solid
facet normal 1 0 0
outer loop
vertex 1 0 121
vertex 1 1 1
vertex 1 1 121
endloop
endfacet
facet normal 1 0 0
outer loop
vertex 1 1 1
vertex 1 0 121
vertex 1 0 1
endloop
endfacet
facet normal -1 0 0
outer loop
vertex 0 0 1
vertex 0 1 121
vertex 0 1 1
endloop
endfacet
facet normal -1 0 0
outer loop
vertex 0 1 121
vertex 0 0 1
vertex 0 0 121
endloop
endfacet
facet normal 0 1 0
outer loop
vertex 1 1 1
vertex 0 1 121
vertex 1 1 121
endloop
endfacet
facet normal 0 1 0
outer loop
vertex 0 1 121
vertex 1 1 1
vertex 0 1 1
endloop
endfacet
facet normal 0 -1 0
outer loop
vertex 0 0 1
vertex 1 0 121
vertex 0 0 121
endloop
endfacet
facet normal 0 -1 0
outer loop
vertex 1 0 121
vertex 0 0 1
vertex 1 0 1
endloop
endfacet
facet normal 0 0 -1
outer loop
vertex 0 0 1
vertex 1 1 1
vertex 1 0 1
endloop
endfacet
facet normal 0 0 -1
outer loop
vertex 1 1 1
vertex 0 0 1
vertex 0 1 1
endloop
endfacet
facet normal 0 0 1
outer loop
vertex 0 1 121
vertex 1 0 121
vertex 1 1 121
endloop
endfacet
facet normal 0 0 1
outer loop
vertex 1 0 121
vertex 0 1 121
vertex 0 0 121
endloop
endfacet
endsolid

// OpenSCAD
// A recursive module 120 deep. OpenSCAD handles hundreds; this engine capped
// at 16, which rejects the ordinary recursive-tree idiom outright.
module tower(n) { if (n > 0) { translate([0, 0, n]) cube(1); tower(n - 1); } }
tower(120);
